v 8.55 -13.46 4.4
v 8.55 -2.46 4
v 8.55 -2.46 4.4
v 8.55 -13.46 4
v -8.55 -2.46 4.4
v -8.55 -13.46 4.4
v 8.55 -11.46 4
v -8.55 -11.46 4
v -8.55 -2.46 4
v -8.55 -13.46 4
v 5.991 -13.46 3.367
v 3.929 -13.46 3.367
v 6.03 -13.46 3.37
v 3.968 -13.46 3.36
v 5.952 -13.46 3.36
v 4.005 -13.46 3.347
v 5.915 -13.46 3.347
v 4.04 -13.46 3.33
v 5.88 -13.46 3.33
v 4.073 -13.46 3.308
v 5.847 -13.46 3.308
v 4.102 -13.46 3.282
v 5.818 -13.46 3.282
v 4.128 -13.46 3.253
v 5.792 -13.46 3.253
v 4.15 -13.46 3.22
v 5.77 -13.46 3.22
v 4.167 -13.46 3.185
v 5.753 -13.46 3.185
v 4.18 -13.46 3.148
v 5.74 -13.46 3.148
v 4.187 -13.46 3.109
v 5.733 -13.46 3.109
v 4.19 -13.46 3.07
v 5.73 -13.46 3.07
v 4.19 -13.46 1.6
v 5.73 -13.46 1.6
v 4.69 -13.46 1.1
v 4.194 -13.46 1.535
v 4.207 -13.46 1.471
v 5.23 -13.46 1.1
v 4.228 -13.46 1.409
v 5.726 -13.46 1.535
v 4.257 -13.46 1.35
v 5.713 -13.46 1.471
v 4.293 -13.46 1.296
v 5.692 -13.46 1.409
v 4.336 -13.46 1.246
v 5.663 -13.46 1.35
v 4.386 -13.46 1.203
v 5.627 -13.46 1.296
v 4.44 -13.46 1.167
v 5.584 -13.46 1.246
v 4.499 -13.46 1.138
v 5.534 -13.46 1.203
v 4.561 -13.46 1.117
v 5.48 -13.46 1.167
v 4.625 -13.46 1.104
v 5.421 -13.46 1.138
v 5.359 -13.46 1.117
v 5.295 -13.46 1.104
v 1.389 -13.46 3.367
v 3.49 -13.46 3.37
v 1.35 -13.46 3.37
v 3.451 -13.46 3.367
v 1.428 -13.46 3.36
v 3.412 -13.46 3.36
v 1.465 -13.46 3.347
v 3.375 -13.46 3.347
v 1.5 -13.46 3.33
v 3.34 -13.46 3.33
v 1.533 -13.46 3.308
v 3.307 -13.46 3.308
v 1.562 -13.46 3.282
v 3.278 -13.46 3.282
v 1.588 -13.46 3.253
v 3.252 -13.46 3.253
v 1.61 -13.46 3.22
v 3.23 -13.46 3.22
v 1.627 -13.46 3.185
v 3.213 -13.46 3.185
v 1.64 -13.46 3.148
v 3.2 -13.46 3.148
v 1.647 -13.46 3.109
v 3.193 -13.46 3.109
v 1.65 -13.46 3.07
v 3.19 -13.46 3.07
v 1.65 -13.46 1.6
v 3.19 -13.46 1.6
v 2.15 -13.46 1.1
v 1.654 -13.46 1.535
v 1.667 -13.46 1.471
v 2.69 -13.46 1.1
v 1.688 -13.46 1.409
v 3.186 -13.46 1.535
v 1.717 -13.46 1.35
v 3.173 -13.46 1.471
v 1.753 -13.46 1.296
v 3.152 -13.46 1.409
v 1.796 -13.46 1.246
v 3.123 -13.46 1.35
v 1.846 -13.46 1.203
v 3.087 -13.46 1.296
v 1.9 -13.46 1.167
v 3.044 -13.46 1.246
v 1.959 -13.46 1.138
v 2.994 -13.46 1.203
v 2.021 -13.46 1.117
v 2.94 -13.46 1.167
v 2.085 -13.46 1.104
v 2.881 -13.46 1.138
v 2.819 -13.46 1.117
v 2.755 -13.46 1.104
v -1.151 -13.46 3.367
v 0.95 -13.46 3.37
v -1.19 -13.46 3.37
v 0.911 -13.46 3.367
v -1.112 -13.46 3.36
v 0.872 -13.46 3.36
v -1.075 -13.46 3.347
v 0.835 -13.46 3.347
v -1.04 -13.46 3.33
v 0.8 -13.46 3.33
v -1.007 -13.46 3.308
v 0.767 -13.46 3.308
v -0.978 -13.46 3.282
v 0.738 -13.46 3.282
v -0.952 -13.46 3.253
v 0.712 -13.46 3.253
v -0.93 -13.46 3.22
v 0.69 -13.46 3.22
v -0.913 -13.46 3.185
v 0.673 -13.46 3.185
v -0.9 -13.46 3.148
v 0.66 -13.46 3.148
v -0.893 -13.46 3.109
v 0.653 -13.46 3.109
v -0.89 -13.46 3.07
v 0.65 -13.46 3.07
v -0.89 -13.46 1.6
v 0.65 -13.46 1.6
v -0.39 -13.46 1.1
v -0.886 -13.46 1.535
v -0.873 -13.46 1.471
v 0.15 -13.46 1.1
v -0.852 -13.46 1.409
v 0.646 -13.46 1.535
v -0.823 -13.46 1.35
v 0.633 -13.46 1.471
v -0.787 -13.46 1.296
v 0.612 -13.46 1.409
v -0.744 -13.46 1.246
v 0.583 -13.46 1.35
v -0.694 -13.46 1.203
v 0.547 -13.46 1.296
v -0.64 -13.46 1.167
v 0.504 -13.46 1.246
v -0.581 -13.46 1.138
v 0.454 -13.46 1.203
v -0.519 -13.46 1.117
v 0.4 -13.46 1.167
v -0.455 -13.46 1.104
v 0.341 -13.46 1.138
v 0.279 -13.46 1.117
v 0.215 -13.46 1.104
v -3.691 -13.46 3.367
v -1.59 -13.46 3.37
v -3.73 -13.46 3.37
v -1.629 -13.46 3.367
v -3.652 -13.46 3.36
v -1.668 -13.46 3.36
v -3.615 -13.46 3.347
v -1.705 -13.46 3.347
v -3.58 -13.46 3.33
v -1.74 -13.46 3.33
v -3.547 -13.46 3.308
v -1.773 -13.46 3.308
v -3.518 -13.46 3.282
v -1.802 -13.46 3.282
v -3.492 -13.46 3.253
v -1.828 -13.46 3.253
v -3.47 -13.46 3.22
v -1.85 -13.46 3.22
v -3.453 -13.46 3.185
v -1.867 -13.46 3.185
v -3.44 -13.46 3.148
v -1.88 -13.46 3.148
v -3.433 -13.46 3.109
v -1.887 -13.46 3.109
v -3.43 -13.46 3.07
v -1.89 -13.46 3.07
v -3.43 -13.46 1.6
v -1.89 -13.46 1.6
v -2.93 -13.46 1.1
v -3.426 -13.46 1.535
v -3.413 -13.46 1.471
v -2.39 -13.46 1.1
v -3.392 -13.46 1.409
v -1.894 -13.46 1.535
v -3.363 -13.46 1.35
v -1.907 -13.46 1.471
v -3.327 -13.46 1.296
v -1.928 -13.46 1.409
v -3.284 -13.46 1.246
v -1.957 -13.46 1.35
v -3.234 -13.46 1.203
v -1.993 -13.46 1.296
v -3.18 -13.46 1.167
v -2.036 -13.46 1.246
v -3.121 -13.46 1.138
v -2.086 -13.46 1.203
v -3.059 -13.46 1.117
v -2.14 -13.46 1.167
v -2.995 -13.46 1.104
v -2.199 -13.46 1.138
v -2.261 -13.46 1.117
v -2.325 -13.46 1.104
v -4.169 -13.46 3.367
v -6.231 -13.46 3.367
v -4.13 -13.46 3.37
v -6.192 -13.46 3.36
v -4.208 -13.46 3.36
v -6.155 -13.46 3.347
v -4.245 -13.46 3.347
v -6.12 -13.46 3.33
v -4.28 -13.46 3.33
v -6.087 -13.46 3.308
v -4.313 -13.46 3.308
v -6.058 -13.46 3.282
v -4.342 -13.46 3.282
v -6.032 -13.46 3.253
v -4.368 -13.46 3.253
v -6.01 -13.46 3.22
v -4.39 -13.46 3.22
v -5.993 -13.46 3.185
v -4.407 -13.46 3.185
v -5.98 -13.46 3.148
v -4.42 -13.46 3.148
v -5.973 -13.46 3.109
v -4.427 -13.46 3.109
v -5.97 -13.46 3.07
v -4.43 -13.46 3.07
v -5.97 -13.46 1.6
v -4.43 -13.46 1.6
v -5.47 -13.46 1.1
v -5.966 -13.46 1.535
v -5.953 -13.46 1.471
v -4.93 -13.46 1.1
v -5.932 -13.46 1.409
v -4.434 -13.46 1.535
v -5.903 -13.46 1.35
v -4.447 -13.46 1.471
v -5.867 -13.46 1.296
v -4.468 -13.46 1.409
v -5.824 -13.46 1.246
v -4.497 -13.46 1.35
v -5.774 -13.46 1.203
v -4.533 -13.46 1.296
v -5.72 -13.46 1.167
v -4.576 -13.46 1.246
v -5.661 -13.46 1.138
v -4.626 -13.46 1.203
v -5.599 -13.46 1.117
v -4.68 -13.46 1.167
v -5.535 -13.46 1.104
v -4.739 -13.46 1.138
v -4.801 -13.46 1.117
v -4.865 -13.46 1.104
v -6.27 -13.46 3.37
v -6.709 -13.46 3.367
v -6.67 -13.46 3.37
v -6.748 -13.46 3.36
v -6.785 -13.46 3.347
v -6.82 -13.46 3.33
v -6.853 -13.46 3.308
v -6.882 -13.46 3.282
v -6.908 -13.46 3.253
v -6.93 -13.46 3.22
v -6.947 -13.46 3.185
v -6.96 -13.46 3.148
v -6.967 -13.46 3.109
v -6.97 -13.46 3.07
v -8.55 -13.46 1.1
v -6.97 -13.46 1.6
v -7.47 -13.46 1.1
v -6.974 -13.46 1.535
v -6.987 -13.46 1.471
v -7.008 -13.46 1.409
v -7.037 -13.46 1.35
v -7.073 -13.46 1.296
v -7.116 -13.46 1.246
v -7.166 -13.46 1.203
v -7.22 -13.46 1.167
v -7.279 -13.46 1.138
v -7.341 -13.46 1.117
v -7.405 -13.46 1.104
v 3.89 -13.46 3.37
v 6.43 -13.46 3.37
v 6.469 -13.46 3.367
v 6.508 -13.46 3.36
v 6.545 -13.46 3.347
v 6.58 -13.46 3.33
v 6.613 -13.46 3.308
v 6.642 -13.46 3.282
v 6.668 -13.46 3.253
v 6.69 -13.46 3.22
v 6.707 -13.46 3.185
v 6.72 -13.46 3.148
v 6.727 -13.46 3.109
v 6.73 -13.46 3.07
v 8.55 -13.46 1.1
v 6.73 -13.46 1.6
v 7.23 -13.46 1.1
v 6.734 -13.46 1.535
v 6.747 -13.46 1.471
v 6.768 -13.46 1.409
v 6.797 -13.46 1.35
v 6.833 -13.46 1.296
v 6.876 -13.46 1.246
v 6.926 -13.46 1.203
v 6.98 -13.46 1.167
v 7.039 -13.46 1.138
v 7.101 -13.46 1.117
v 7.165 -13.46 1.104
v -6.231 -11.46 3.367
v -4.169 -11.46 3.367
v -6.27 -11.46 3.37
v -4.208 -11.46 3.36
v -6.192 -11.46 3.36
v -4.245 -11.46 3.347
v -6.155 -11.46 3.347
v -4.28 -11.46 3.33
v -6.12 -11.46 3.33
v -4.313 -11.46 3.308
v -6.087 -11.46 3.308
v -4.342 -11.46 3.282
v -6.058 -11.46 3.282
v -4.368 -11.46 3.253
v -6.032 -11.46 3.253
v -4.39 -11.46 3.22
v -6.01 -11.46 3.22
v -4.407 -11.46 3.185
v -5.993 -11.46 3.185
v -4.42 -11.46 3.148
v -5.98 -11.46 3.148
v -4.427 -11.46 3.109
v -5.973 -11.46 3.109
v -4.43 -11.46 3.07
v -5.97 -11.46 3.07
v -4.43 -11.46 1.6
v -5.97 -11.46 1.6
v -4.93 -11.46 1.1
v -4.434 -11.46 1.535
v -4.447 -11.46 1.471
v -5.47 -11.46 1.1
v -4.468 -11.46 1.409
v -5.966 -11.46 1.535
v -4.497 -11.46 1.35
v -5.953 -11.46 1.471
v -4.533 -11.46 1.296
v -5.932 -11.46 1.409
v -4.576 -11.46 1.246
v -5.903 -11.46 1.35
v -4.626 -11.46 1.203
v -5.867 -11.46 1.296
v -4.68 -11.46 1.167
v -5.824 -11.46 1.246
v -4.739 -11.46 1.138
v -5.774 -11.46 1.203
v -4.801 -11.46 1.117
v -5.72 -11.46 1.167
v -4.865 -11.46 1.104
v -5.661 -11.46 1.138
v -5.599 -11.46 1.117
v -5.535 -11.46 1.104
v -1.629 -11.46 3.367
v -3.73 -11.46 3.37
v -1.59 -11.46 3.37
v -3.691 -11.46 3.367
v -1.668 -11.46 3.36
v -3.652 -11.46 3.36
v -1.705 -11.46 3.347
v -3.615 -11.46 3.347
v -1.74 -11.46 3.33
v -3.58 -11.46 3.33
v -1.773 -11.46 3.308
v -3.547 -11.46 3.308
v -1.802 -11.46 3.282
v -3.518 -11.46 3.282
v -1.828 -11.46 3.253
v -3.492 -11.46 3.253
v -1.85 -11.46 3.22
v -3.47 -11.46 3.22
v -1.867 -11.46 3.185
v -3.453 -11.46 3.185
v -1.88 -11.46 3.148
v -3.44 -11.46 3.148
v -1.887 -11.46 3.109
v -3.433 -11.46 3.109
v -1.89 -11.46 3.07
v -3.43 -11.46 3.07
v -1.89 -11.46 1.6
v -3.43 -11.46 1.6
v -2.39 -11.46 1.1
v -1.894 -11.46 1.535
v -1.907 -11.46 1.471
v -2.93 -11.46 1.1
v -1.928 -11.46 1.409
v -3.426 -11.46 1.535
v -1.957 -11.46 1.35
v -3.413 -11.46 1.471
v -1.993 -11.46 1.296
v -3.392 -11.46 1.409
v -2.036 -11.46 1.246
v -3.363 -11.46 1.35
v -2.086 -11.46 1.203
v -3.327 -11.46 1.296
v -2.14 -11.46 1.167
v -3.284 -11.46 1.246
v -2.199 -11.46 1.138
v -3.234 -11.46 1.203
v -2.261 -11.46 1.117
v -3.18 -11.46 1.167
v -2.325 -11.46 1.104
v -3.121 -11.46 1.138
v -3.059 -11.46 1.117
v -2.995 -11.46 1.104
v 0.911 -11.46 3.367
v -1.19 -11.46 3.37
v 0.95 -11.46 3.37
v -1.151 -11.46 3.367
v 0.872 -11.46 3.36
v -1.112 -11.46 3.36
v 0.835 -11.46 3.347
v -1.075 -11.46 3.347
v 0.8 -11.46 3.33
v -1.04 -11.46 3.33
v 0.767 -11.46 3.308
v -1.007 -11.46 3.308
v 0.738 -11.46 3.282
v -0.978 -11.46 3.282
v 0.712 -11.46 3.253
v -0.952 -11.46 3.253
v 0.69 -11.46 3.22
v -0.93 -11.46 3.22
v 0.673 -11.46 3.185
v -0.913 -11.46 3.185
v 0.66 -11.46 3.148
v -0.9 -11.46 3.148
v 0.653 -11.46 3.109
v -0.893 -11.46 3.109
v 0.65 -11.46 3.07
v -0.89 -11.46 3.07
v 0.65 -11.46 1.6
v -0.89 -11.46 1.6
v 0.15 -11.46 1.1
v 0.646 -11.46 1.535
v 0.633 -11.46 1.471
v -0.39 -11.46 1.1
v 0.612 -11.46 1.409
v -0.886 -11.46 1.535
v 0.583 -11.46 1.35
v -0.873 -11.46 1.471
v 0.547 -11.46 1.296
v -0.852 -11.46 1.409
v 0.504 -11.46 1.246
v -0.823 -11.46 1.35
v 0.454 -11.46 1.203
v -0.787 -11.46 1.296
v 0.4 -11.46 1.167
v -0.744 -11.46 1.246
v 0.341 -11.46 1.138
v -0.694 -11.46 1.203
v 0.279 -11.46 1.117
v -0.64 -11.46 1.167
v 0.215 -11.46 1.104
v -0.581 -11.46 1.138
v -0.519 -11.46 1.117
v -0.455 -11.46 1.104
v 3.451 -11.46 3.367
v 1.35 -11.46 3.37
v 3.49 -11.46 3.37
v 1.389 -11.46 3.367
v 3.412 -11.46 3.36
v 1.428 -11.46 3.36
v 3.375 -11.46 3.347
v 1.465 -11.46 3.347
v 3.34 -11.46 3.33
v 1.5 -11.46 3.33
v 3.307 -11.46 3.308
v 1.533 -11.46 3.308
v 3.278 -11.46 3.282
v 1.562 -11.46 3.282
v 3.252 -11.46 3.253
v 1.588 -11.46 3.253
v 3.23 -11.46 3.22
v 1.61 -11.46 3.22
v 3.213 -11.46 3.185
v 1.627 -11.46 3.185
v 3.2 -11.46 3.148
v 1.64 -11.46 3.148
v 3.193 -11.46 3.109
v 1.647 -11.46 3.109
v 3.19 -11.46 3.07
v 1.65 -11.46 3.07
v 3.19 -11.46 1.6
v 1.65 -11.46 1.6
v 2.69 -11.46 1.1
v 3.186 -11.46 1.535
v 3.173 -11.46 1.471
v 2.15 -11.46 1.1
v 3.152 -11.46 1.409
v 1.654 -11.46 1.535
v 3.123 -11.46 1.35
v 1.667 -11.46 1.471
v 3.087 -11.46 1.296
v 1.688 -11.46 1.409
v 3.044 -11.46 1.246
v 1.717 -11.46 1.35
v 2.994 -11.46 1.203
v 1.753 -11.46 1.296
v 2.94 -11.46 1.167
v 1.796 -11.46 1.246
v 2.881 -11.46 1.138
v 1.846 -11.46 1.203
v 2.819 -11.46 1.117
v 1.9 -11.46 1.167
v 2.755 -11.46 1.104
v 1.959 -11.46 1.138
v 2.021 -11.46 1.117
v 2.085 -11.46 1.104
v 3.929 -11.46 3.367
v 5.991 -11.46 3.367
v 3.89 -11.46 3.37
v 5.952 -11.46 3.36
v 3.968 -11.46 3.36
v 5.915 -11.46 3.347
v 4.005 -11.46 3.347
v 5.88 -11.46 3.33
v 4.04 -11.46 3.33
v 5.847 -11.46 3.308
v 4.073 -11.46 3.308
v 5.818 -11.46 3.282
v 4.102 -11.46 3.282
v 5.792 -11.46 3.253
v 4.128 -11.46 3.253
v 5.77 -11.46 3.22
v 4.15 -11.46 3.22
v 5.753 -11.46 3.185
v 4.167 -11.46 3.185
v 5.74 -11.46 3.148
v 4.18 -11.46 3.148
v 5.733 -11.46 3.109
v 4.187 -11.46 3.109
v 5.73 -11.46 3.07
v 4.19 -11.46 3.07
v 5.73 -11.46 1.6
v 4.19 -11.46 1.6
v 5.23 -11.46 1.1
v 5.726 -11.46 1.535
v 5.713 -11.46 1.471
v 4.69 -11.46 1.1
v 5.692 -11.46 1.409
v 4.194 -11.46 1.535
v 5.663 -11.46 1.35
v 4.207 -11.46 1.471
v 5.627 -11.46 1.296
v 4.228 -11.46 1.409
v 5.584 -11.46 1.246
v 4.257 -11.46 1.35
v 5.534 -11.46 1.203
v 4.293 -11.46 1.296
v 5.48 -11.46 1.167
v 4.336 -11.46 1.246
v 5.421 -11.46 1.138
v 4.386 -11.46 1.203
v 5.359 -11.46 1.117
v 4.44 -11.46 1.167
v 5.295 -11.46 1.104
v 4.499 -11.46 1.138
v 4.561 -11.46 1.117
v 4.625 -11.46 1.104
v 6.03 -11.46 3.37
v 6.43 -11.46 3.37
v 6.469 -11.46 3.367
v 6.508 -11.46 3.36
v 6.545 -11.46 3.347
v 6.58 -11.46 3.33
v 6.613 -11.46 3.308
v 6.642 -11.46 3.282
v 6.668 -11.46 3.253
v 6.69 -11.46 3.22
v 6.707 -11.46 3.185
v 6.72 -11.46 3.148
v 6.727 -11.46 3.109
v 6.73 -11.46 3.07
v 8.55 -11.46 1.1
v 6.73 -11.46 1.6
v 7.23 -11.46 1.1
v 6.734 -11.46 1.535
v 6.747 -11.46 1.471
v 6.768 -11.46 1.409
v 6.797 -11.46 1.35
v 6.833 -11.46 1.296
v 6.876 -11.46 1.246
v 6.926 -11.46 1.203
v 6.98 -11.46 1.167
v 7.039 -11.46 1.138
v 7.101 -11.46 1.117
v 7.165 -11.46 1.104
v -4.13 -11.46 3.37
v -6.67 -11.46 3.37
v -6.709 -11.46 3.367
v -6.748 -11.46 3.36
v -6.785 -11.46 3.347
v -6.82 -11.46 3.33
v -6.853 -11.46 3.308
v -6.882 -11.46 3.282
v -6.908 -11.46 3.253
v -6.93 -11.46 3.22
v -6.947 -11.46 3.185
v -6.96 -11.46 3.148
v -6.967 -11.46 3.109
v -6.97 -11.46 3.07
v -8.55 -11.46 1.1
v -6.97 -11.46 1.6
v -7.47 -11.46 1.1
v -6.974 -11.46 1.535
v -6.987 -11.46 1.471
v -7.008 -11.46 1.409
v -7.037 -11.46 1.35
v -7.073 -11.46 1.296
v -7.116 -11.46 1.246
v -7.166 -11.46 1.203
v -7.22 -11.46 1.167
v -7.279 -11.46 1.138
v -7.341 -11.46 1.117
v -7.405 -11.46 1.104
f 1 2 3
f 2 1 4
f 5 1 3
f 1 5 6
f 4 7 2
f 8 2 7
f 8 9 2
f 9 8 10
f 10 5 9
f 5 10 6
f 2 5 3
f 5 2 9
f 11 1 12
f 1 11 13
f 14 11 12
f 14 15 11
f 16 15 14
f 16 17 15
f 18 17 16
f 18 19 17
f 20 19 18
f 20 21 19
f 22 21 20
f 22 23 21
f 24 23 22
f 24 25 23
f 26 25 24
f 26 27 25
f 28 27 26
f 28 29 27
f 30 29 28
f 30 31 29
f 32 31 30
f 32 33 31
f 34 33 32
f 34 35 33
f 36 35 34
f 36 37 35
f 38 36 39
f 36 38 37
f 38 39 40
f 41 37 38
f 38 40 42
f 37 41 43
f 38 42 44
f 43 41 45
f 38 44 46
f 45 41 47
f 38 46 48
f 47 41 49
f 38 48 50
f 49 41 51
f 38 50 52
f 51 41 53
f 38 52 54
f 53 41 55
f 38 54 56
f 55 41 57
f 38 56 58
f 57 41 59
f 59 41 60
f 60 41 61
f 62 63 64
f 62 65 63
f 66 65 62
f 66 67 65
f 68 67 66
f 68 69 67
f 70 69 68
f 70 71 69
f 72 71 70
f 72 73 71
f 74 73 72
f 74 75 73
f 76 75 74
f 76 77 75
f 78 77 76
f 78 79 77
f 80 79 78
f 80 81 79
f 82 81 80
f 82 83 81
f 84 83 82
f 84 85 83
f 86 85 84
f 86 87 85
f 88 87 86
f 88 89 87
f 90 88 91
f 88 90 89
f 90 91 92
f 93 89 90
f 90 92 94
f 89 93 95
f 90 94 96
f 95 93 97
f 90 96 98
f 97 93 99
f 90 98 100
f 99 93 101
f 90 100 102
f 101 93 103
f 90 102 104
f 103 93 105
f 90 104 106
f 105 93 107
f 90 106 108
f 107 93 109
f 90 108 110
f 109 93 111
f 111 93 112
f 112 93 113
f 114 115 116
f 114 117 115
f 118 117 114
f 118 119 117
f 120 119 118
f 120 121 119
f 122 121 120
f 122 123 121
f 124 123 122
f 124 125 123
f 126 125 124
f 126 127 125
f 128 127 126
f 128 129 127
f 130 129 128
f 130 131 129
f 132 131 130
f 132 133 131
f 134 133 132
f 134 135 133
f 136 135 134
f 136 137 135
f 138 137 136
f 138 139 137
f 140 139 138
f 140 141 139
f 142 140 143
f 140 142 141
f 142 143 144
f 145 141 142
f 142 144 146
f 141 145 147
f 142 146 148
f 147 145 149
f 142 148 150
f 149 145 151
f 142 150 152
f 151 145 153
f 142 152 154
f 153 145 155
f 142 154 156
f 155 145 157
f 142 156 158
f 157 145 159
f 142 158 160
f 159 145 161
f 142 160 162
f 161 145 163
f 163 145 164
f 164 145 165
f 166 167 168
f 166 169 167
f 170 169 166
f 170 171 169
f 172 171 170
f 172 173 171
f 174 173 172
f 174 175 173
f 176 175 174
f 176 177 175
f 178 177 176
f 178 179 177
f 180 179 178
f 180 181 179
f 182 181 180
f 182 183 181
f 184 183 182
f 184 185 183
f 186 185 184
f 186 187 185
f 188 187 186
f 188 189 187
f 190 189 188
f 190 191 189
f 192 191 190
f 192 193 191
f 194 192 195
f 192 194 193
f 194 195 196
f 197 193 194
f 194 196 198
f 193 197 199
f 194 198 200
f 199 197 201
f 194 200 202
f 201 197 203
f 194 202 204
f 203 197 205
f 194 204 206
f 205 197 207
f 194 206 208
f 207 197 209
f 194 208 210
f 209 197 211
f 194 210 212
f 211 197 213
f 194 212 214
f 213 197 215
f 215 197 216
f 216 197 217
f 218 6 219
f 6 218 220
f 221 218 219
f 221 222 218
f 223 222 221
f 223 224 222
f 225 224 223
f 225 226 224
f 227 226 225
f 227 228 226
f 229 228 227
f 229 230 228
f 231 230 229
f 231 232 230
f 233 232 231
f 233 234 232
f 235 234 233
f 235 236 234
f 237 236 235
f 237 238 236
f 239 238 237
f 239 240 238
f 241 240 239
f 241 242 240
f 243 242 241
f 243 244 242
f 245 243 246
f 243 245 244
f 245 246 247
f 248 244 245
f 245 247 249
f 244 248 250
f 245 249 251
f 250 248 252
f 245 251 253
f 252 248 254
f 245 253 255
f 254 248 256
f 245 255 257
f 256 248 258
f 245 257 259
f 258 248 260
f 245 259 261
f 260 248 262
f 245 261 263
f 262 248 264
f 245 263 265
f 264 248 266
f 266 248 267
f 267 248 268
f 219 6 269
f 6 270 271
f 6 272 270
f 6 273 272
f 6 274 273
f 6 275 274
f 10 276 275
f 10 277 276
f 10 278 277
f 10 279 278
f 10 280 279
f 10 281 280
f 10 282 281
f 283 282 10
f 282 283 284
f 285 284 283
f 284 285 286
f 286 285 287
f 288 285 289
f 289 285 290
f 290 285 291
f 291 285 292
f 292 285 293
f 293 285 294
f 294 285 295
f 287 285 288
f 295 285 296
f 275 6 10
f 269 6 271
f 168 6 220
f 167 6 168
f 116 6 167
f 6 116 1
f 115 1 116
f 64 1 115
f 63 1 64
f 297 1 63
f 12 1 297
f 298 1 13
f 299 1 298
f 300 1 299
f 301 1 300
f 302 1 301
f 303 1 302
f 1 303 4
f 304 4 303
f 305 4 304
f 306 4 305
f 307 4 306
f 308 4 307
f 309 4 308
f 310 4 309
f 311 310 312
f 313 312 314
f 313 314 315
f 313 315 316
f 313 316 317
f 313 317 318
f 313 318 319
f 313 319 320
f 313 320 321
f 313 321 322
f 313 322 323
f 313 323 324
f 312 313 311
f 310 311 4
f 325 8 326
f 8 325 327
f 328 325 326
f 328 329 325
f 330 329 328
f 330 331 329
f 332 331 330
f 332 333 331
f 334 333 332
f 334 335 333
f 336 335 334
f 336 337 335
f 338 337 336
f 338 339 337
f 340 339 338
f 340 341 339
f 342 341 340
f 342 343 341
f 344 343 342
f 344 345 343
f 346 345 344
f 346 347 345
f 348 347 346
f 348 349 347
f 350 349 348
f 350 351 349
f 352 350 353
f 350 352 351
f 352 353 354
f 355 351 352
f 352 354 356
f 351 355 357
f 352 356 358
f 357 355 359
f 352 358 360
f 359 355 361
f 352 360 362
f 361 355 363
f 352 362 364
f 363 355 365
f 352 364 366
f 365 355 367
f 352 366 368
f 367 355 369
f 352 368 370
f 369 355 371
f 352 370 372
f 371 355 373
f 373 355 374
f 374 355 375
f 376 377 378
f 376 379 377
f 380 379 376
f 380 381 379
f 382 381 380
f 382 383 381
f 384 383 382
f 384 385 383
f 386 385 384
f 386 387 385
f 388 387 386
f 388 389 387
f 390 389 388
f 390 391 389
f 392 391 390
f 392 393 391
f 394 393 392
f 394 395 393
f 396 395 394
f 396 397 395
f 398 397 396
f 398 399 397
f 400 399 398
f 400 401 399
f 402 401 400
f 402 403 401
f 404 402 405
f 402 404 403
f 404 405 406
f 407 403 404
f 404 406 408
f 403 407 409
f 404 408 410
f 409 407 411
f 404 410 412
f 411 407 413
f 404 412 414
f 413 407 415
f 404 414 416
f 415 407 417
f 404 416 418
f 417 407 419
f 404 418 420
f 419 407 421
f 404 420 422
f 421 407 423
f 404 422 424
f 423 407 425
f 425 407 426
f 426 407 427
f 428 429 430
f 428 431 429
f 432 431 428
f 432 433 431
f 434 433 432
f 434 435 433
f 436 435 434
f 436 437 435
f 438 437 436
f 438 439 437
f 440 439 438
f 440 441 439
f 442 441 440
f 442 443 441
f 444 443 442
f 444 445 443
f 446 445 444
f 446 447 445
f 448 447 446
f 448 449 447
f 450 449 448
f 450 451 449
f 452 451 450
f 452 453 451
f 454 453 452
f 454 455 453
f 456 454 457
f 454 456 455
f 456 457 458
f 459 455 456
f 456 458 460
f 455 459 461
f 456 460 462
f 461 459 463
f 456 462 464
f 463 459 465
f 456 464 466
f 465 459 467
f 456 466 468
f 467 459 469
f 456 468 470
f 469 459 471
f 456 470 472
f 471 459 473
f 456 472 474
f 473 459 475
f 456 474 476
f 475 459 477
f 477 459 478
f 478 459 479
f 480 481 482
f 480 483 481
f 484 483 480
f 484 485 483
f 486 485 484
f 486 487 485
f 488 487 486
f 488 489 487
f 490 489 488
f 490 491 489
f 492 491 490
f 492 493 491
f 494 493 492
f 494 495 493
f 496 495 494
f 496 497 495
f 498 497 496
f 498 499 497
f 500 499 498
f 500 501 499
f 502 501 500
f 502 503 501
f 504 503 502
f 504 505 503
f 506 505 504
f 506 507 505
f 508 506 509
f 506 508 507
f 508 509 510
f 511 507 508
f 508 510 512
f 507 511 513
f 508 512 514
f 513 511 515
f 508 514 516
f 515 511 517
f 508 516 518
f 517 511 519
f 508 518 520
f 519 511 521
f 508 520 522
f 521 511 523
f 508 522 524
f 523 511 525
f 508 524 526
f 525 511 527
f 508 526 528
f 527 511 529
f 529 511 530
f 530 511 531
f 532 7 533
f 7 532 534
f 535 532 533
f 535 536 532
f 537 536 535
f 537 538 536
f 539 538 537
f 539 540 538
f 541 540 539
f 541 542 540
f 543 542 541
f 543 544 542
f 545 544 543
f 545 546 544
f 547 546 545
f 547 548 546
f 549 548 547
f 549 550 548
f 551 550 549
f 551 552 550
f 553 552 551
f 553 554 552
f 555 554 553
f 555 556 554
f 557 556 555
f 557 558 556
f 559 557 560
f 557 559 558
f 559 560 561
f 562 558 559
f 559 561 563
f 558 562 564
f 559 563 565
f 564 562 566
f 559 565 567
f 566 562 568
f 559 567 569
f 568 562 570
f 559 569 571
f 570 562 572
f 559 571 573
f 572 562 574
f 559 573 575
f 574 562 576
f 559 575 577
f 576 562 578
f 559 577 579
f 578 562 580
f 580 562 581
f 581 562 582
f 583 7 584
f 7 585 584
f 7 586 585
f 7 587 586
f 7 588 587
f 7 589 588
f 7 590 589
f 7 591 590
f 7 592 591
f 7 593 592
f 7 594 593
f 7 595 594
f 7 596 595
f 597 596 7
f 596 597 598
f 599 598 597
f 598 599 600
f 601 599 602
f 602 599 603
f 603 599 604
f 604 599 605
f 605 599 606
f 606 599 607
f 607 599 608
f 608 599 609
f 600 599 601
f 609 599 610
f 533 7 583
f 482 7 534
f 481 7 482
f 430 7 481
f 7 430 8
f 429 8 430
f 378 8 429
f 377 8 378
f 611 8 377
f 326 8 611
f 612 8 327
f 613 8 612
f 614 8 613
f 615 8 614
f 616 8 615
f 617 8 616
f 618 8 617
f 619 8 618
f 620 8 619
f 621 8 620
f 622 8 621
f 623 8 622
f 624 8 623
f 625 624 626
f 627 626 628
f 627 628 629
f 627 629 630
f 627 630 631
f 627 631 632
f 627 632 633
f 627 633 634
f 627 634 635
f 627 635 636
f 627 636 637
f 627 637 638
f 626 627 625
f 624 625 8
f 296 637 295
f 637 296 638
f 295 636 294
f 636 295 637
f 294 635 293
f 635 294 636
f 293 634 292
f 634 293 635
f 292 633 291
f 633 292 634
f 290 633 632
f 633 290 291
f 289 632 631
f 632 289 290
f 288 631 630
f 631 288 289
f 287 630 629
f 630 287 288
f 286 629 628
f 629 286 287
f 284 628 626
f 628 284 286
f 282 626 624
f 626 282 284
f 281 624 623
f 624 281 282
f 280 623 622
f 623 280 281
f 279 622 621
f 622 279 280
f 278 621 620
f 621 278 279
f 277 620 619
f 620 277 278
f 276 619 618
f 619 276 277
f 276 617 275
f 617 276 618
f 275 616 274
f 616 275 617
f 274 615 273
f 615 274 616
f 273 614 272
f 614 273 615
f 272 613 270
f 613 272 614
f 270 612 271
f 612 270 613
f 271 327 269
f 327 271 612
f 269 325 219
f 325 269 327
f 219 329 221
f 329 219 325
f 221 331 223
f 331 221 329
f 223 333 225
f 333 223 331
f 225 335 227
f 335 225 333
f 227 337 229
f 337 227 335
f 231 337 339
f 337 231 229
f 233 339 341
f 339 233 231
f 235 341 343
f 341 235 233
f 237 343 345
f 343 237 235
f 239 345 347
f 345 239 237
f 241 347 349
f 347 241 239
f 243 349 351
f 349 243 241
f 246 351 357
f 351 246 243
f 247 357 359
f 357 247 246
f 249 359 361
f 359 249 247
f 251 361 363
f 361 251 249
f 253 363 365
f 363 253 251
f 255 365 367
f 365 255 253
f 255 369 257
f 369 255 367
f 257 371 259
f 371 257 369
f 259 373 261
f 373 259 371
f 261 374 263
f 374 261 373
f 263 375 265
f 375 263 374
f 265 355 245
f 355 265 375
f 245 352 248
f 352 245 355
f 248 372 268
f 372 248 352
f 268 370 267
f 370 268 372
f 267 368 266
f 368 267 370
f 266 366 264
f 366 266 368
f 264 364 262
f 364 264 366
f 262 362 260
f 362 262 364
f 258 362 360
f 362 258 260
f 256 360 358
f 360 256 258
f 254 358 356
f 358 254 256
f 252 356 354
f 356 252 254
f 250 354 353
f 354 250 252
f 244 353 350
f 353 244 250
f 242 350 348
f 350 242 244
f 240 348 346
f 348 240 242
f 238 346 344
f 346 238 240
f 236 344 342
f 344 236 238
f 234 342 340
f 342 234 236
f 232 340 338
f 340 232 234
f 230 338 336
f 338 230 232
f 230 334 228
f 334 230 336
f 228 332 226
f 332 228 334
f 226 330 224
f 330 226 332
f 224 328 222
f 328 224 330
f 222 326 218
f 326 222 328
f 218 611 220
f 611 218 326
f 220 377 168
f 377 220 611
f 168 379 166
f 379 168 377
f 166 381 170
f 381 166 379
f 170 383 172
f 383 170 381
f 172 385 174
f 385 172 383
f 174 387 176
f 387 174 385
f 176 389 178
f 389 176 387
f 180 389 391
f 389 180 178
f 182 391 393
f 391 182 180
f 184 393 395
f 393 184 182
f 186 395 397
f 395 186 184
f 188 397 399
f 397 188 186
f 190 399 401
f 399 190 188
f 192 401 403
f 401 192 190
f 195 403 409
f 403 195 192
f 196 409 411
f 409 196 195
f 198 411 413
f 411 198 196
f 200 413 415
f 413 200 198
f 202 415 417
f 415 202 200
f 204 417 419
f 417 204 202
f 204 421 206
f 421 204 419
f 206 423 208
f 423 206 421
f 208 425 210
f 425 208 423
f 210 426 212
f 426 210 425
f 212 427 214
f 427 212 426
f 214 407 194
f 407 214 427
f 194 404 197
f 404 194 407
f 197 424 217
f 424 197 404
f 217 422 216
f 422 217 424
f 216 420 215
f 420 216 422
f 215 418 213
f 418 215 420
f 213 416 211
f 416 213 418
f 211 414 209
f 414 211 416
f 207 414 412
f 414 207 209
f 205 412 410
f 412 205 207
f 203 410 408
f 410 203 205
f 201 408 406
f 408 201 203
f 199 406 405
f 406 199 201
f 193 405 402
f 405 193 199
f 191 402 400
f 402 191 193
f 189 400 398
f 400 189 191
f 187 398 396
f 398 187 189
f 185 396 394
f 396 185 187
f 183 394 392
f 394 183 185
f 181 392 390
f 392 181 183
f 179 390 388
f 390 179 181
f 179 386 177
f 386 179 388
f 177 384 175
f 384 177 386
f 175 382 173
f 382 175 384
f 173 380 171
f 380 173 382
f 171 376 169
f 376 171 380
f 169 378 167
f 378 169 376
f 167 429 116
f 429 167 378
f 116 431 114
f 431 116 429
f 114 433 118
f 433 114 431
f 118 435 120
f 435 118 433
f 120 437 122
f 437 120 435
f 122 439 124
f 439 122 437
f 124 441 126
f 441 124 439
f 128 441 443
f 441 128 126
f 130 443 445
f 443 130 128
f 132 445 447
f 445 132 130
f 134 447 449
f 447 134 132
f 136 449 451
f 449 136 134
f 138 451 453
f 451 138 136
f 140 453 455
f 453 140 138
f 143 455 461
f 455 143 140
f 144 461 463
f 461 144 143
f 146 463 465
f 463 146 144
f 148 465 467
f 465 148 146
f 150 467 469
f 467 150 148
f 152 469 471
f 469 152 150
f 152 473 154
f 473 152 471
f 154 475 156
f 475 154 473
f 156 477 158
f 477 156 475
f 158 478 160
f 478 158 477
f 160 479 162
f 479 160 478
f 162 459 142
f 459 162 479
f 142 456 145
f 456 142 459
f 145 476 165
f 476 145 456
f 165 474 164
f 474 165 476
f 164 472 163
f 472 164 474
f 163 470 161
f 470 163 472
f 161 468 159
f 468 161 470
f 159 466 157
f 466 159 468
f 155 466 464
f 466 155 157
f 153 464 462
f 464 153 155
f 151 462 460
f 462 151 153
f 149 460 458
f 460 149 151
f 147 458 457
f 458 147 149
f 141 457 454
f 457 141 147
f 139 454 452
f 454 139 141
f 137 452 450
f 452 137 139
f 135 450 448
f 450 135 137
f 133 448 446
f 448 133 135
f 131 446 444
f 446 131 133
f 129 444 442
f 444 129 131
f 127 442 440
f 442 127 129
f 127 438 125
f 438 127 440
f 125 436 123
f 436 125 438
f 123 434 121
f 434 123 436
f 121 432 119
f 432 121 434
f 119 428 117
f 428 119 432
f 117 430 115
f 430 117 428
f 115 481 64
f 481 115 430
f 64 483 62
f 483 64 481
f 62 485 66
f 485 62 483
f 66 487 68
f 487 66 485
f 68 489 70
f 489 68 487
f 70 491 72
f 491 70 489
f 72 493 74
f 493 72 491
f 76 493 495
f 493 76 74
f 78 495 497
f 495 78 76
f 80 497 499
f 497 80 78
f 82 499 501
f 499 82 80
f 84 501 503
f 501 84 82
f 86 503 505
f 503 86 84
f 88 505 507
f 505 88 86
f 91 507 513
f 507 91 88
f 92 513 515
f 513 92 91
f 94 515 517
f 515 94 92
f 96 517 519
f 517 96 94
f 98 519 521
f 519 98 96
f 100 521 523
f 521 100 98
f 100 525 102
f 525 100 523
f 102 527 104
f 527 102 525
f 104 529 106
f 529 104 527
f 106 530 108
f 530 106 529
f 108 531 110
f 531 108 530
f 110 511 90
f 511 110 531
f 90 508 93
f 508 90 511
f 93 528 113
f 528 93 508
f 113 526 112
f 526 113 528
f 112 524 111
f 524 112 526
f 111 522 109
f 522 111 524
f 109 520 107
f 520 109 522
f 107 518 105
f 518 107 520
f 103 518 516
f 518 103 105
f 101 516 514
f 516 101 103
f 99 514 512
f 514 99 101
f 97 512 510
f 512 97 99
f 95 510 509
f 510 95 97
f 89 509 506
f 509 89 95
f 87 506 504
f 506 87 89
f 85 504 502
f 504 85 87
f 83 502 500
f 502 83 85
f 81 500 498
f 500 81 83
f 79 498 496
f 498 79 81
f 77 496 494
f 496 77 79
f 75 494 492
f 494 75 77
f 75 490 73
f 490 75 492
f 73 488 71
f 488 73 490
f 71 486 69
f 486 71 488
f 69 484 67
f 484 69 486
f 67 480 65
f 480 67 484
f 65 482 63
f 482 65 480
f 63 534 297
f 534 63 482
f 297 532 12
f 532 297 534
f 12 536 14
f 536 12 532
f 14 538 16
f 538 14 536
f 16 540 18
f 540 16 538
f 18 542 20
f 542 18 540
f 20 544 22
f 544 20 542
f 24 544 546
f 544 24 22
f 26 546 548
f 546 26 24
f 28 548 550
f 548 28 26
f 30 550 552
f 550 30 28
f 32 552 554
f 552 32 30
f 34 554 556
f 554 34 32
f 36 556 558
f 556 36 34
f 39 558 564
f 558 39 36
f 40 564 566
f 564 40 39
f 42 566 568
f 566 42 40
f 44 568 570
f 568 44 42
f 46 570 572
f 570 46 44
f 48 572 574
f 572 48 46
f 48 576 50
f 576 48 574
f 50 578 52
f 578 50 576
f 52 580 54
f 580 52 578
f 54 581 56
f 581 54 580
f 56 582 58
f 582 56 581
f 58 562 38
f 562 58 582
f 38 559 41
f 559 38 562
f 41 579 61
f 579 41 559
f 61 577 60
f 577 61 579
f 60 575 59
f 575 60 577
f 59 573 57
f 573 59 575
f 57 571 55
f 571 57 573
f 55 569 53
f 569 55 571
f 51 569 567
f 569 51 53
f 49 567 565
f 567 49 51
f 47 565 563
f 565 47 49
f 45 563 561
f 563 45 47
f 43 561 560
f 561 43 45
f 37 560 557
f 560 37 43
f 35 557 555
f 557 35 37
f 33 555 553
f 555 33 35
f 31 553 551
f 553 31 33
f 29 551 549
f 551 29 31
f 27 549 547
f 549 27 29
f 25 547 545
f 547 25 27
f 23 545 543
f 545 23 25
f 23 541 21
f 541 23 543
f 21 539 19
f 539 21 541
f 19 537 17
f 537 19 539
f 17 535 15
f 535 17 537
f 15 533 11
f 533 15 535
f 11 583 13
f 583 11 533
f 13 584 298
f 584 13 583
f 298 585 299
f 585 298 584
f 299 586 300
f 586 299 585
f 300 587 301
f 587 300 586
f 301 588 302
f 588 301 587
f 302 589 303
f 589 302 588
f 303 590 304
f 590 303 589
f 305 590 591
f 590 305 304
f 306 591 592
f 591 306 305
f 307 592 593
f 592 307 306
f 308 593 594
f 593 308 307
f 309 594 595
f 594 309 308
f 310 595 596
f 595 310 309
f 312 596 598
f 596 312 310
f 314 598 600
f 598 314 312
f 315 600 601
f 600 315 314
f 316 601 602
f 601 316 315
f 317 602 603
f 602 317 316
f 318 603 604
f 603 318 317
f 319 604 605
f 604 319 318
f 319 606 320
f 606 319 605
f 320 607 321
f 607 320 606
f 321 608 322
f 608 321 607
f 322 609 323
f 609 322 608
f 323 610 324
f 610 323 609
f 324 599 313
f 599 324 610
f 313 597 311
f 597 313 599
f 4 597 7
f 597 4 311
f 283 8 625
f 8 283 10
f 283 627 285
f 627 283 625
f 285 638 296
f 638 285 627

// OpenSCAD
// file: strain_relief_comb.scad
// Strain-relief comb — shared section for #810-001 and #810-002.
// No part and no top-level geometry: it only defines modules.
//
// The comb grips the C-708 6-pin cable's wires. Its section is drawn in 2D in
// x and "height" (the z of the parts' frame); the including part extrudes it
// along y. Comb thickness along y is COMB_T.
//
// The six grooves sit at x = COMB_CX + (k - 2.5) * COMB_PITCH, k = 0..5. The
// meshes measure the pattern centre at -0.131 (Top) and -0.109 (Bottom); the
// design value -0.120 is the one both parts take.
//
//     groove width        1.000     pitch 2.540
//     groove-end corners  R0.3      where a groove meets its ceiling or floor
//     tooth-tip corners   R0.5      only where a tip meets a groove; the
//                                   comb's outer ends, x = +-8.55, are square
//     comb length         x +-8.55

COMB_T        = 2.000;
COMB_HALF     = 8.550;
COMB_CX       = -0.120;
COMB_PITCH    = 2.540;
COMB_GROOVES  = 6;
COMB_GROOVE_W = 1.000;
COMB_END_R    = 0.300;
COMB_TIP_R    = 0.500;

function comb_xs() =
    [for (k = [0 : COMB_GROOVES - 1]) COMB_CX + (k - (COMB_GROOVES - 1) / 2) * COMB_PITCH];

// The grooves' voids with the tips at u = 0 and the ends at u = depth; they
// overrun the tips so only the end corners are rounded within the material.
module comb_voids(depth)
    offset(r = COMB_END_R) offset(delta = -COMB_END_R)
        for (x = comb_xs())
            translate([x - COMB_GROOVE_W / 2, -1]) square([COMB_GROOVE_W, depth + 1]);

// The band's material, wider than the comb and deeper than its band, so that
// opening it rounds only the tips at the grooves; the caller trims it back to
// the square ends and the band's far edge.
module comb_material(depth)
    offset(r = COMB_TIP_R) offset(delta = -COMB_TIP_R)
        difference() {
            translate([-COMB_HALF - 2, 0]) square([2 * COMB_HALF + 4, depth + 2]);
            comb_voids(depth);
        }

// The comb's 2D section in x and height. `tip` is the teeth tips' height,
// `end` the grooves' ceiling or floor, `far` the far edge of the full-material
// band, which runs from `end` towards `far` (the same side as `end` lies from
// `tip`).
module comb_section_2d(tip, end, far) {
    dir = sign(end - tip);
    translate([0, tip]) scale([1, dir])
        intersection() {
            comb_material(abs(end - tip));
            translate([-COMB_HALF, -1]) square([2 * COMB_HALF, abs(far - tip) + 1]);
        }
}
// main file
// #810-001 6-Pin Strain Relief (Top) — parametric source.
// The upper half of the clamp that grips the C-708 6-pin cable's wires. Its
// plate seats on the Bottom's rails (#810-002) and its comb hangs down to meet
// the Bottom's comb face to face.
//
//   config = "previous" — a faithful recreation of the reference mesh
//                         (../Reference/meshes/800-Harness/).
//   config = "revised"  — identical to "previous"; see FITS.
//
// FRAME. The reference's own: x along the comb, the plate's top at z = 4.4, the
// comb's outer face at y = -13.46, the mating face at y = -11.46.
//
// Measured from the reference (scadmesh), feature IDs as in
// 810-001_6PinStrainReliefTop.view.json:
//
//     ID  feature   value
//     P1  plate     x +-8.55, y -13.46 .. -2.46, z 4.0 .. 4.4
//     K1  comb      y -13.46 .. -11.46; full material z 3.37 .. 4.0, teeth
//                   hang to tips at z 1.1; six grooves rise to a ceiling at
//                   z 3.37 (the section is strain_relief_comb.scad's)
//
// The measured groove pattern centre is -0.131; the shared design value is
// -0.120 (strain_relief_comb.scad).
//
// CONSTRUCTION. Rung 1, region split: the plate cuboid joined to the comb's
// section extruded 2.0 along y, lapped by 0.005.
//
// FITS: none. The plate seats on the Bottom's rails at z 4.0 and the two combs
// meet face to face at y -11.46 (seats, exempt); the grooves grip the wires.
// "revised" therefore equals "previous".

include <strain_relief_comb.scad>

/* [Configuration] */
// Parameter set: previous (reference) or revised
config = "previous"; // [previous, revised]

/* [Hidden] */
$fn = 48;
PLATE_Y = [-13.46, -2.46];
PLATE_Z = [4.0, 4.4];
TIP_Z   = 1.1;
CEIL_Z  = 3.37;
BAND_UP = 0.2;     // the comb's band runs this far up into the plate

module plate()
    translate([-COMB_HALF, PLATE_Y[0], PLATE_Z[0]])
        cube([2 * COMB_HALF, PLATE_Y[1] - PLATE_Y[0], PLATE_Z[1] - PLATE_Z[0]]);

module comb()
    translate([0, PLATE_Y[0] + COMB_T, 0]) rotate([90, 0, 0])
        linear_extrude(COMB_T) comb_section_2d(TIP_Z, CEIL_Z, PLATE_Z[0] + BAND_UP);

module strain_relief_top() union() { plate(); comb(); }

strain_relief_top();
